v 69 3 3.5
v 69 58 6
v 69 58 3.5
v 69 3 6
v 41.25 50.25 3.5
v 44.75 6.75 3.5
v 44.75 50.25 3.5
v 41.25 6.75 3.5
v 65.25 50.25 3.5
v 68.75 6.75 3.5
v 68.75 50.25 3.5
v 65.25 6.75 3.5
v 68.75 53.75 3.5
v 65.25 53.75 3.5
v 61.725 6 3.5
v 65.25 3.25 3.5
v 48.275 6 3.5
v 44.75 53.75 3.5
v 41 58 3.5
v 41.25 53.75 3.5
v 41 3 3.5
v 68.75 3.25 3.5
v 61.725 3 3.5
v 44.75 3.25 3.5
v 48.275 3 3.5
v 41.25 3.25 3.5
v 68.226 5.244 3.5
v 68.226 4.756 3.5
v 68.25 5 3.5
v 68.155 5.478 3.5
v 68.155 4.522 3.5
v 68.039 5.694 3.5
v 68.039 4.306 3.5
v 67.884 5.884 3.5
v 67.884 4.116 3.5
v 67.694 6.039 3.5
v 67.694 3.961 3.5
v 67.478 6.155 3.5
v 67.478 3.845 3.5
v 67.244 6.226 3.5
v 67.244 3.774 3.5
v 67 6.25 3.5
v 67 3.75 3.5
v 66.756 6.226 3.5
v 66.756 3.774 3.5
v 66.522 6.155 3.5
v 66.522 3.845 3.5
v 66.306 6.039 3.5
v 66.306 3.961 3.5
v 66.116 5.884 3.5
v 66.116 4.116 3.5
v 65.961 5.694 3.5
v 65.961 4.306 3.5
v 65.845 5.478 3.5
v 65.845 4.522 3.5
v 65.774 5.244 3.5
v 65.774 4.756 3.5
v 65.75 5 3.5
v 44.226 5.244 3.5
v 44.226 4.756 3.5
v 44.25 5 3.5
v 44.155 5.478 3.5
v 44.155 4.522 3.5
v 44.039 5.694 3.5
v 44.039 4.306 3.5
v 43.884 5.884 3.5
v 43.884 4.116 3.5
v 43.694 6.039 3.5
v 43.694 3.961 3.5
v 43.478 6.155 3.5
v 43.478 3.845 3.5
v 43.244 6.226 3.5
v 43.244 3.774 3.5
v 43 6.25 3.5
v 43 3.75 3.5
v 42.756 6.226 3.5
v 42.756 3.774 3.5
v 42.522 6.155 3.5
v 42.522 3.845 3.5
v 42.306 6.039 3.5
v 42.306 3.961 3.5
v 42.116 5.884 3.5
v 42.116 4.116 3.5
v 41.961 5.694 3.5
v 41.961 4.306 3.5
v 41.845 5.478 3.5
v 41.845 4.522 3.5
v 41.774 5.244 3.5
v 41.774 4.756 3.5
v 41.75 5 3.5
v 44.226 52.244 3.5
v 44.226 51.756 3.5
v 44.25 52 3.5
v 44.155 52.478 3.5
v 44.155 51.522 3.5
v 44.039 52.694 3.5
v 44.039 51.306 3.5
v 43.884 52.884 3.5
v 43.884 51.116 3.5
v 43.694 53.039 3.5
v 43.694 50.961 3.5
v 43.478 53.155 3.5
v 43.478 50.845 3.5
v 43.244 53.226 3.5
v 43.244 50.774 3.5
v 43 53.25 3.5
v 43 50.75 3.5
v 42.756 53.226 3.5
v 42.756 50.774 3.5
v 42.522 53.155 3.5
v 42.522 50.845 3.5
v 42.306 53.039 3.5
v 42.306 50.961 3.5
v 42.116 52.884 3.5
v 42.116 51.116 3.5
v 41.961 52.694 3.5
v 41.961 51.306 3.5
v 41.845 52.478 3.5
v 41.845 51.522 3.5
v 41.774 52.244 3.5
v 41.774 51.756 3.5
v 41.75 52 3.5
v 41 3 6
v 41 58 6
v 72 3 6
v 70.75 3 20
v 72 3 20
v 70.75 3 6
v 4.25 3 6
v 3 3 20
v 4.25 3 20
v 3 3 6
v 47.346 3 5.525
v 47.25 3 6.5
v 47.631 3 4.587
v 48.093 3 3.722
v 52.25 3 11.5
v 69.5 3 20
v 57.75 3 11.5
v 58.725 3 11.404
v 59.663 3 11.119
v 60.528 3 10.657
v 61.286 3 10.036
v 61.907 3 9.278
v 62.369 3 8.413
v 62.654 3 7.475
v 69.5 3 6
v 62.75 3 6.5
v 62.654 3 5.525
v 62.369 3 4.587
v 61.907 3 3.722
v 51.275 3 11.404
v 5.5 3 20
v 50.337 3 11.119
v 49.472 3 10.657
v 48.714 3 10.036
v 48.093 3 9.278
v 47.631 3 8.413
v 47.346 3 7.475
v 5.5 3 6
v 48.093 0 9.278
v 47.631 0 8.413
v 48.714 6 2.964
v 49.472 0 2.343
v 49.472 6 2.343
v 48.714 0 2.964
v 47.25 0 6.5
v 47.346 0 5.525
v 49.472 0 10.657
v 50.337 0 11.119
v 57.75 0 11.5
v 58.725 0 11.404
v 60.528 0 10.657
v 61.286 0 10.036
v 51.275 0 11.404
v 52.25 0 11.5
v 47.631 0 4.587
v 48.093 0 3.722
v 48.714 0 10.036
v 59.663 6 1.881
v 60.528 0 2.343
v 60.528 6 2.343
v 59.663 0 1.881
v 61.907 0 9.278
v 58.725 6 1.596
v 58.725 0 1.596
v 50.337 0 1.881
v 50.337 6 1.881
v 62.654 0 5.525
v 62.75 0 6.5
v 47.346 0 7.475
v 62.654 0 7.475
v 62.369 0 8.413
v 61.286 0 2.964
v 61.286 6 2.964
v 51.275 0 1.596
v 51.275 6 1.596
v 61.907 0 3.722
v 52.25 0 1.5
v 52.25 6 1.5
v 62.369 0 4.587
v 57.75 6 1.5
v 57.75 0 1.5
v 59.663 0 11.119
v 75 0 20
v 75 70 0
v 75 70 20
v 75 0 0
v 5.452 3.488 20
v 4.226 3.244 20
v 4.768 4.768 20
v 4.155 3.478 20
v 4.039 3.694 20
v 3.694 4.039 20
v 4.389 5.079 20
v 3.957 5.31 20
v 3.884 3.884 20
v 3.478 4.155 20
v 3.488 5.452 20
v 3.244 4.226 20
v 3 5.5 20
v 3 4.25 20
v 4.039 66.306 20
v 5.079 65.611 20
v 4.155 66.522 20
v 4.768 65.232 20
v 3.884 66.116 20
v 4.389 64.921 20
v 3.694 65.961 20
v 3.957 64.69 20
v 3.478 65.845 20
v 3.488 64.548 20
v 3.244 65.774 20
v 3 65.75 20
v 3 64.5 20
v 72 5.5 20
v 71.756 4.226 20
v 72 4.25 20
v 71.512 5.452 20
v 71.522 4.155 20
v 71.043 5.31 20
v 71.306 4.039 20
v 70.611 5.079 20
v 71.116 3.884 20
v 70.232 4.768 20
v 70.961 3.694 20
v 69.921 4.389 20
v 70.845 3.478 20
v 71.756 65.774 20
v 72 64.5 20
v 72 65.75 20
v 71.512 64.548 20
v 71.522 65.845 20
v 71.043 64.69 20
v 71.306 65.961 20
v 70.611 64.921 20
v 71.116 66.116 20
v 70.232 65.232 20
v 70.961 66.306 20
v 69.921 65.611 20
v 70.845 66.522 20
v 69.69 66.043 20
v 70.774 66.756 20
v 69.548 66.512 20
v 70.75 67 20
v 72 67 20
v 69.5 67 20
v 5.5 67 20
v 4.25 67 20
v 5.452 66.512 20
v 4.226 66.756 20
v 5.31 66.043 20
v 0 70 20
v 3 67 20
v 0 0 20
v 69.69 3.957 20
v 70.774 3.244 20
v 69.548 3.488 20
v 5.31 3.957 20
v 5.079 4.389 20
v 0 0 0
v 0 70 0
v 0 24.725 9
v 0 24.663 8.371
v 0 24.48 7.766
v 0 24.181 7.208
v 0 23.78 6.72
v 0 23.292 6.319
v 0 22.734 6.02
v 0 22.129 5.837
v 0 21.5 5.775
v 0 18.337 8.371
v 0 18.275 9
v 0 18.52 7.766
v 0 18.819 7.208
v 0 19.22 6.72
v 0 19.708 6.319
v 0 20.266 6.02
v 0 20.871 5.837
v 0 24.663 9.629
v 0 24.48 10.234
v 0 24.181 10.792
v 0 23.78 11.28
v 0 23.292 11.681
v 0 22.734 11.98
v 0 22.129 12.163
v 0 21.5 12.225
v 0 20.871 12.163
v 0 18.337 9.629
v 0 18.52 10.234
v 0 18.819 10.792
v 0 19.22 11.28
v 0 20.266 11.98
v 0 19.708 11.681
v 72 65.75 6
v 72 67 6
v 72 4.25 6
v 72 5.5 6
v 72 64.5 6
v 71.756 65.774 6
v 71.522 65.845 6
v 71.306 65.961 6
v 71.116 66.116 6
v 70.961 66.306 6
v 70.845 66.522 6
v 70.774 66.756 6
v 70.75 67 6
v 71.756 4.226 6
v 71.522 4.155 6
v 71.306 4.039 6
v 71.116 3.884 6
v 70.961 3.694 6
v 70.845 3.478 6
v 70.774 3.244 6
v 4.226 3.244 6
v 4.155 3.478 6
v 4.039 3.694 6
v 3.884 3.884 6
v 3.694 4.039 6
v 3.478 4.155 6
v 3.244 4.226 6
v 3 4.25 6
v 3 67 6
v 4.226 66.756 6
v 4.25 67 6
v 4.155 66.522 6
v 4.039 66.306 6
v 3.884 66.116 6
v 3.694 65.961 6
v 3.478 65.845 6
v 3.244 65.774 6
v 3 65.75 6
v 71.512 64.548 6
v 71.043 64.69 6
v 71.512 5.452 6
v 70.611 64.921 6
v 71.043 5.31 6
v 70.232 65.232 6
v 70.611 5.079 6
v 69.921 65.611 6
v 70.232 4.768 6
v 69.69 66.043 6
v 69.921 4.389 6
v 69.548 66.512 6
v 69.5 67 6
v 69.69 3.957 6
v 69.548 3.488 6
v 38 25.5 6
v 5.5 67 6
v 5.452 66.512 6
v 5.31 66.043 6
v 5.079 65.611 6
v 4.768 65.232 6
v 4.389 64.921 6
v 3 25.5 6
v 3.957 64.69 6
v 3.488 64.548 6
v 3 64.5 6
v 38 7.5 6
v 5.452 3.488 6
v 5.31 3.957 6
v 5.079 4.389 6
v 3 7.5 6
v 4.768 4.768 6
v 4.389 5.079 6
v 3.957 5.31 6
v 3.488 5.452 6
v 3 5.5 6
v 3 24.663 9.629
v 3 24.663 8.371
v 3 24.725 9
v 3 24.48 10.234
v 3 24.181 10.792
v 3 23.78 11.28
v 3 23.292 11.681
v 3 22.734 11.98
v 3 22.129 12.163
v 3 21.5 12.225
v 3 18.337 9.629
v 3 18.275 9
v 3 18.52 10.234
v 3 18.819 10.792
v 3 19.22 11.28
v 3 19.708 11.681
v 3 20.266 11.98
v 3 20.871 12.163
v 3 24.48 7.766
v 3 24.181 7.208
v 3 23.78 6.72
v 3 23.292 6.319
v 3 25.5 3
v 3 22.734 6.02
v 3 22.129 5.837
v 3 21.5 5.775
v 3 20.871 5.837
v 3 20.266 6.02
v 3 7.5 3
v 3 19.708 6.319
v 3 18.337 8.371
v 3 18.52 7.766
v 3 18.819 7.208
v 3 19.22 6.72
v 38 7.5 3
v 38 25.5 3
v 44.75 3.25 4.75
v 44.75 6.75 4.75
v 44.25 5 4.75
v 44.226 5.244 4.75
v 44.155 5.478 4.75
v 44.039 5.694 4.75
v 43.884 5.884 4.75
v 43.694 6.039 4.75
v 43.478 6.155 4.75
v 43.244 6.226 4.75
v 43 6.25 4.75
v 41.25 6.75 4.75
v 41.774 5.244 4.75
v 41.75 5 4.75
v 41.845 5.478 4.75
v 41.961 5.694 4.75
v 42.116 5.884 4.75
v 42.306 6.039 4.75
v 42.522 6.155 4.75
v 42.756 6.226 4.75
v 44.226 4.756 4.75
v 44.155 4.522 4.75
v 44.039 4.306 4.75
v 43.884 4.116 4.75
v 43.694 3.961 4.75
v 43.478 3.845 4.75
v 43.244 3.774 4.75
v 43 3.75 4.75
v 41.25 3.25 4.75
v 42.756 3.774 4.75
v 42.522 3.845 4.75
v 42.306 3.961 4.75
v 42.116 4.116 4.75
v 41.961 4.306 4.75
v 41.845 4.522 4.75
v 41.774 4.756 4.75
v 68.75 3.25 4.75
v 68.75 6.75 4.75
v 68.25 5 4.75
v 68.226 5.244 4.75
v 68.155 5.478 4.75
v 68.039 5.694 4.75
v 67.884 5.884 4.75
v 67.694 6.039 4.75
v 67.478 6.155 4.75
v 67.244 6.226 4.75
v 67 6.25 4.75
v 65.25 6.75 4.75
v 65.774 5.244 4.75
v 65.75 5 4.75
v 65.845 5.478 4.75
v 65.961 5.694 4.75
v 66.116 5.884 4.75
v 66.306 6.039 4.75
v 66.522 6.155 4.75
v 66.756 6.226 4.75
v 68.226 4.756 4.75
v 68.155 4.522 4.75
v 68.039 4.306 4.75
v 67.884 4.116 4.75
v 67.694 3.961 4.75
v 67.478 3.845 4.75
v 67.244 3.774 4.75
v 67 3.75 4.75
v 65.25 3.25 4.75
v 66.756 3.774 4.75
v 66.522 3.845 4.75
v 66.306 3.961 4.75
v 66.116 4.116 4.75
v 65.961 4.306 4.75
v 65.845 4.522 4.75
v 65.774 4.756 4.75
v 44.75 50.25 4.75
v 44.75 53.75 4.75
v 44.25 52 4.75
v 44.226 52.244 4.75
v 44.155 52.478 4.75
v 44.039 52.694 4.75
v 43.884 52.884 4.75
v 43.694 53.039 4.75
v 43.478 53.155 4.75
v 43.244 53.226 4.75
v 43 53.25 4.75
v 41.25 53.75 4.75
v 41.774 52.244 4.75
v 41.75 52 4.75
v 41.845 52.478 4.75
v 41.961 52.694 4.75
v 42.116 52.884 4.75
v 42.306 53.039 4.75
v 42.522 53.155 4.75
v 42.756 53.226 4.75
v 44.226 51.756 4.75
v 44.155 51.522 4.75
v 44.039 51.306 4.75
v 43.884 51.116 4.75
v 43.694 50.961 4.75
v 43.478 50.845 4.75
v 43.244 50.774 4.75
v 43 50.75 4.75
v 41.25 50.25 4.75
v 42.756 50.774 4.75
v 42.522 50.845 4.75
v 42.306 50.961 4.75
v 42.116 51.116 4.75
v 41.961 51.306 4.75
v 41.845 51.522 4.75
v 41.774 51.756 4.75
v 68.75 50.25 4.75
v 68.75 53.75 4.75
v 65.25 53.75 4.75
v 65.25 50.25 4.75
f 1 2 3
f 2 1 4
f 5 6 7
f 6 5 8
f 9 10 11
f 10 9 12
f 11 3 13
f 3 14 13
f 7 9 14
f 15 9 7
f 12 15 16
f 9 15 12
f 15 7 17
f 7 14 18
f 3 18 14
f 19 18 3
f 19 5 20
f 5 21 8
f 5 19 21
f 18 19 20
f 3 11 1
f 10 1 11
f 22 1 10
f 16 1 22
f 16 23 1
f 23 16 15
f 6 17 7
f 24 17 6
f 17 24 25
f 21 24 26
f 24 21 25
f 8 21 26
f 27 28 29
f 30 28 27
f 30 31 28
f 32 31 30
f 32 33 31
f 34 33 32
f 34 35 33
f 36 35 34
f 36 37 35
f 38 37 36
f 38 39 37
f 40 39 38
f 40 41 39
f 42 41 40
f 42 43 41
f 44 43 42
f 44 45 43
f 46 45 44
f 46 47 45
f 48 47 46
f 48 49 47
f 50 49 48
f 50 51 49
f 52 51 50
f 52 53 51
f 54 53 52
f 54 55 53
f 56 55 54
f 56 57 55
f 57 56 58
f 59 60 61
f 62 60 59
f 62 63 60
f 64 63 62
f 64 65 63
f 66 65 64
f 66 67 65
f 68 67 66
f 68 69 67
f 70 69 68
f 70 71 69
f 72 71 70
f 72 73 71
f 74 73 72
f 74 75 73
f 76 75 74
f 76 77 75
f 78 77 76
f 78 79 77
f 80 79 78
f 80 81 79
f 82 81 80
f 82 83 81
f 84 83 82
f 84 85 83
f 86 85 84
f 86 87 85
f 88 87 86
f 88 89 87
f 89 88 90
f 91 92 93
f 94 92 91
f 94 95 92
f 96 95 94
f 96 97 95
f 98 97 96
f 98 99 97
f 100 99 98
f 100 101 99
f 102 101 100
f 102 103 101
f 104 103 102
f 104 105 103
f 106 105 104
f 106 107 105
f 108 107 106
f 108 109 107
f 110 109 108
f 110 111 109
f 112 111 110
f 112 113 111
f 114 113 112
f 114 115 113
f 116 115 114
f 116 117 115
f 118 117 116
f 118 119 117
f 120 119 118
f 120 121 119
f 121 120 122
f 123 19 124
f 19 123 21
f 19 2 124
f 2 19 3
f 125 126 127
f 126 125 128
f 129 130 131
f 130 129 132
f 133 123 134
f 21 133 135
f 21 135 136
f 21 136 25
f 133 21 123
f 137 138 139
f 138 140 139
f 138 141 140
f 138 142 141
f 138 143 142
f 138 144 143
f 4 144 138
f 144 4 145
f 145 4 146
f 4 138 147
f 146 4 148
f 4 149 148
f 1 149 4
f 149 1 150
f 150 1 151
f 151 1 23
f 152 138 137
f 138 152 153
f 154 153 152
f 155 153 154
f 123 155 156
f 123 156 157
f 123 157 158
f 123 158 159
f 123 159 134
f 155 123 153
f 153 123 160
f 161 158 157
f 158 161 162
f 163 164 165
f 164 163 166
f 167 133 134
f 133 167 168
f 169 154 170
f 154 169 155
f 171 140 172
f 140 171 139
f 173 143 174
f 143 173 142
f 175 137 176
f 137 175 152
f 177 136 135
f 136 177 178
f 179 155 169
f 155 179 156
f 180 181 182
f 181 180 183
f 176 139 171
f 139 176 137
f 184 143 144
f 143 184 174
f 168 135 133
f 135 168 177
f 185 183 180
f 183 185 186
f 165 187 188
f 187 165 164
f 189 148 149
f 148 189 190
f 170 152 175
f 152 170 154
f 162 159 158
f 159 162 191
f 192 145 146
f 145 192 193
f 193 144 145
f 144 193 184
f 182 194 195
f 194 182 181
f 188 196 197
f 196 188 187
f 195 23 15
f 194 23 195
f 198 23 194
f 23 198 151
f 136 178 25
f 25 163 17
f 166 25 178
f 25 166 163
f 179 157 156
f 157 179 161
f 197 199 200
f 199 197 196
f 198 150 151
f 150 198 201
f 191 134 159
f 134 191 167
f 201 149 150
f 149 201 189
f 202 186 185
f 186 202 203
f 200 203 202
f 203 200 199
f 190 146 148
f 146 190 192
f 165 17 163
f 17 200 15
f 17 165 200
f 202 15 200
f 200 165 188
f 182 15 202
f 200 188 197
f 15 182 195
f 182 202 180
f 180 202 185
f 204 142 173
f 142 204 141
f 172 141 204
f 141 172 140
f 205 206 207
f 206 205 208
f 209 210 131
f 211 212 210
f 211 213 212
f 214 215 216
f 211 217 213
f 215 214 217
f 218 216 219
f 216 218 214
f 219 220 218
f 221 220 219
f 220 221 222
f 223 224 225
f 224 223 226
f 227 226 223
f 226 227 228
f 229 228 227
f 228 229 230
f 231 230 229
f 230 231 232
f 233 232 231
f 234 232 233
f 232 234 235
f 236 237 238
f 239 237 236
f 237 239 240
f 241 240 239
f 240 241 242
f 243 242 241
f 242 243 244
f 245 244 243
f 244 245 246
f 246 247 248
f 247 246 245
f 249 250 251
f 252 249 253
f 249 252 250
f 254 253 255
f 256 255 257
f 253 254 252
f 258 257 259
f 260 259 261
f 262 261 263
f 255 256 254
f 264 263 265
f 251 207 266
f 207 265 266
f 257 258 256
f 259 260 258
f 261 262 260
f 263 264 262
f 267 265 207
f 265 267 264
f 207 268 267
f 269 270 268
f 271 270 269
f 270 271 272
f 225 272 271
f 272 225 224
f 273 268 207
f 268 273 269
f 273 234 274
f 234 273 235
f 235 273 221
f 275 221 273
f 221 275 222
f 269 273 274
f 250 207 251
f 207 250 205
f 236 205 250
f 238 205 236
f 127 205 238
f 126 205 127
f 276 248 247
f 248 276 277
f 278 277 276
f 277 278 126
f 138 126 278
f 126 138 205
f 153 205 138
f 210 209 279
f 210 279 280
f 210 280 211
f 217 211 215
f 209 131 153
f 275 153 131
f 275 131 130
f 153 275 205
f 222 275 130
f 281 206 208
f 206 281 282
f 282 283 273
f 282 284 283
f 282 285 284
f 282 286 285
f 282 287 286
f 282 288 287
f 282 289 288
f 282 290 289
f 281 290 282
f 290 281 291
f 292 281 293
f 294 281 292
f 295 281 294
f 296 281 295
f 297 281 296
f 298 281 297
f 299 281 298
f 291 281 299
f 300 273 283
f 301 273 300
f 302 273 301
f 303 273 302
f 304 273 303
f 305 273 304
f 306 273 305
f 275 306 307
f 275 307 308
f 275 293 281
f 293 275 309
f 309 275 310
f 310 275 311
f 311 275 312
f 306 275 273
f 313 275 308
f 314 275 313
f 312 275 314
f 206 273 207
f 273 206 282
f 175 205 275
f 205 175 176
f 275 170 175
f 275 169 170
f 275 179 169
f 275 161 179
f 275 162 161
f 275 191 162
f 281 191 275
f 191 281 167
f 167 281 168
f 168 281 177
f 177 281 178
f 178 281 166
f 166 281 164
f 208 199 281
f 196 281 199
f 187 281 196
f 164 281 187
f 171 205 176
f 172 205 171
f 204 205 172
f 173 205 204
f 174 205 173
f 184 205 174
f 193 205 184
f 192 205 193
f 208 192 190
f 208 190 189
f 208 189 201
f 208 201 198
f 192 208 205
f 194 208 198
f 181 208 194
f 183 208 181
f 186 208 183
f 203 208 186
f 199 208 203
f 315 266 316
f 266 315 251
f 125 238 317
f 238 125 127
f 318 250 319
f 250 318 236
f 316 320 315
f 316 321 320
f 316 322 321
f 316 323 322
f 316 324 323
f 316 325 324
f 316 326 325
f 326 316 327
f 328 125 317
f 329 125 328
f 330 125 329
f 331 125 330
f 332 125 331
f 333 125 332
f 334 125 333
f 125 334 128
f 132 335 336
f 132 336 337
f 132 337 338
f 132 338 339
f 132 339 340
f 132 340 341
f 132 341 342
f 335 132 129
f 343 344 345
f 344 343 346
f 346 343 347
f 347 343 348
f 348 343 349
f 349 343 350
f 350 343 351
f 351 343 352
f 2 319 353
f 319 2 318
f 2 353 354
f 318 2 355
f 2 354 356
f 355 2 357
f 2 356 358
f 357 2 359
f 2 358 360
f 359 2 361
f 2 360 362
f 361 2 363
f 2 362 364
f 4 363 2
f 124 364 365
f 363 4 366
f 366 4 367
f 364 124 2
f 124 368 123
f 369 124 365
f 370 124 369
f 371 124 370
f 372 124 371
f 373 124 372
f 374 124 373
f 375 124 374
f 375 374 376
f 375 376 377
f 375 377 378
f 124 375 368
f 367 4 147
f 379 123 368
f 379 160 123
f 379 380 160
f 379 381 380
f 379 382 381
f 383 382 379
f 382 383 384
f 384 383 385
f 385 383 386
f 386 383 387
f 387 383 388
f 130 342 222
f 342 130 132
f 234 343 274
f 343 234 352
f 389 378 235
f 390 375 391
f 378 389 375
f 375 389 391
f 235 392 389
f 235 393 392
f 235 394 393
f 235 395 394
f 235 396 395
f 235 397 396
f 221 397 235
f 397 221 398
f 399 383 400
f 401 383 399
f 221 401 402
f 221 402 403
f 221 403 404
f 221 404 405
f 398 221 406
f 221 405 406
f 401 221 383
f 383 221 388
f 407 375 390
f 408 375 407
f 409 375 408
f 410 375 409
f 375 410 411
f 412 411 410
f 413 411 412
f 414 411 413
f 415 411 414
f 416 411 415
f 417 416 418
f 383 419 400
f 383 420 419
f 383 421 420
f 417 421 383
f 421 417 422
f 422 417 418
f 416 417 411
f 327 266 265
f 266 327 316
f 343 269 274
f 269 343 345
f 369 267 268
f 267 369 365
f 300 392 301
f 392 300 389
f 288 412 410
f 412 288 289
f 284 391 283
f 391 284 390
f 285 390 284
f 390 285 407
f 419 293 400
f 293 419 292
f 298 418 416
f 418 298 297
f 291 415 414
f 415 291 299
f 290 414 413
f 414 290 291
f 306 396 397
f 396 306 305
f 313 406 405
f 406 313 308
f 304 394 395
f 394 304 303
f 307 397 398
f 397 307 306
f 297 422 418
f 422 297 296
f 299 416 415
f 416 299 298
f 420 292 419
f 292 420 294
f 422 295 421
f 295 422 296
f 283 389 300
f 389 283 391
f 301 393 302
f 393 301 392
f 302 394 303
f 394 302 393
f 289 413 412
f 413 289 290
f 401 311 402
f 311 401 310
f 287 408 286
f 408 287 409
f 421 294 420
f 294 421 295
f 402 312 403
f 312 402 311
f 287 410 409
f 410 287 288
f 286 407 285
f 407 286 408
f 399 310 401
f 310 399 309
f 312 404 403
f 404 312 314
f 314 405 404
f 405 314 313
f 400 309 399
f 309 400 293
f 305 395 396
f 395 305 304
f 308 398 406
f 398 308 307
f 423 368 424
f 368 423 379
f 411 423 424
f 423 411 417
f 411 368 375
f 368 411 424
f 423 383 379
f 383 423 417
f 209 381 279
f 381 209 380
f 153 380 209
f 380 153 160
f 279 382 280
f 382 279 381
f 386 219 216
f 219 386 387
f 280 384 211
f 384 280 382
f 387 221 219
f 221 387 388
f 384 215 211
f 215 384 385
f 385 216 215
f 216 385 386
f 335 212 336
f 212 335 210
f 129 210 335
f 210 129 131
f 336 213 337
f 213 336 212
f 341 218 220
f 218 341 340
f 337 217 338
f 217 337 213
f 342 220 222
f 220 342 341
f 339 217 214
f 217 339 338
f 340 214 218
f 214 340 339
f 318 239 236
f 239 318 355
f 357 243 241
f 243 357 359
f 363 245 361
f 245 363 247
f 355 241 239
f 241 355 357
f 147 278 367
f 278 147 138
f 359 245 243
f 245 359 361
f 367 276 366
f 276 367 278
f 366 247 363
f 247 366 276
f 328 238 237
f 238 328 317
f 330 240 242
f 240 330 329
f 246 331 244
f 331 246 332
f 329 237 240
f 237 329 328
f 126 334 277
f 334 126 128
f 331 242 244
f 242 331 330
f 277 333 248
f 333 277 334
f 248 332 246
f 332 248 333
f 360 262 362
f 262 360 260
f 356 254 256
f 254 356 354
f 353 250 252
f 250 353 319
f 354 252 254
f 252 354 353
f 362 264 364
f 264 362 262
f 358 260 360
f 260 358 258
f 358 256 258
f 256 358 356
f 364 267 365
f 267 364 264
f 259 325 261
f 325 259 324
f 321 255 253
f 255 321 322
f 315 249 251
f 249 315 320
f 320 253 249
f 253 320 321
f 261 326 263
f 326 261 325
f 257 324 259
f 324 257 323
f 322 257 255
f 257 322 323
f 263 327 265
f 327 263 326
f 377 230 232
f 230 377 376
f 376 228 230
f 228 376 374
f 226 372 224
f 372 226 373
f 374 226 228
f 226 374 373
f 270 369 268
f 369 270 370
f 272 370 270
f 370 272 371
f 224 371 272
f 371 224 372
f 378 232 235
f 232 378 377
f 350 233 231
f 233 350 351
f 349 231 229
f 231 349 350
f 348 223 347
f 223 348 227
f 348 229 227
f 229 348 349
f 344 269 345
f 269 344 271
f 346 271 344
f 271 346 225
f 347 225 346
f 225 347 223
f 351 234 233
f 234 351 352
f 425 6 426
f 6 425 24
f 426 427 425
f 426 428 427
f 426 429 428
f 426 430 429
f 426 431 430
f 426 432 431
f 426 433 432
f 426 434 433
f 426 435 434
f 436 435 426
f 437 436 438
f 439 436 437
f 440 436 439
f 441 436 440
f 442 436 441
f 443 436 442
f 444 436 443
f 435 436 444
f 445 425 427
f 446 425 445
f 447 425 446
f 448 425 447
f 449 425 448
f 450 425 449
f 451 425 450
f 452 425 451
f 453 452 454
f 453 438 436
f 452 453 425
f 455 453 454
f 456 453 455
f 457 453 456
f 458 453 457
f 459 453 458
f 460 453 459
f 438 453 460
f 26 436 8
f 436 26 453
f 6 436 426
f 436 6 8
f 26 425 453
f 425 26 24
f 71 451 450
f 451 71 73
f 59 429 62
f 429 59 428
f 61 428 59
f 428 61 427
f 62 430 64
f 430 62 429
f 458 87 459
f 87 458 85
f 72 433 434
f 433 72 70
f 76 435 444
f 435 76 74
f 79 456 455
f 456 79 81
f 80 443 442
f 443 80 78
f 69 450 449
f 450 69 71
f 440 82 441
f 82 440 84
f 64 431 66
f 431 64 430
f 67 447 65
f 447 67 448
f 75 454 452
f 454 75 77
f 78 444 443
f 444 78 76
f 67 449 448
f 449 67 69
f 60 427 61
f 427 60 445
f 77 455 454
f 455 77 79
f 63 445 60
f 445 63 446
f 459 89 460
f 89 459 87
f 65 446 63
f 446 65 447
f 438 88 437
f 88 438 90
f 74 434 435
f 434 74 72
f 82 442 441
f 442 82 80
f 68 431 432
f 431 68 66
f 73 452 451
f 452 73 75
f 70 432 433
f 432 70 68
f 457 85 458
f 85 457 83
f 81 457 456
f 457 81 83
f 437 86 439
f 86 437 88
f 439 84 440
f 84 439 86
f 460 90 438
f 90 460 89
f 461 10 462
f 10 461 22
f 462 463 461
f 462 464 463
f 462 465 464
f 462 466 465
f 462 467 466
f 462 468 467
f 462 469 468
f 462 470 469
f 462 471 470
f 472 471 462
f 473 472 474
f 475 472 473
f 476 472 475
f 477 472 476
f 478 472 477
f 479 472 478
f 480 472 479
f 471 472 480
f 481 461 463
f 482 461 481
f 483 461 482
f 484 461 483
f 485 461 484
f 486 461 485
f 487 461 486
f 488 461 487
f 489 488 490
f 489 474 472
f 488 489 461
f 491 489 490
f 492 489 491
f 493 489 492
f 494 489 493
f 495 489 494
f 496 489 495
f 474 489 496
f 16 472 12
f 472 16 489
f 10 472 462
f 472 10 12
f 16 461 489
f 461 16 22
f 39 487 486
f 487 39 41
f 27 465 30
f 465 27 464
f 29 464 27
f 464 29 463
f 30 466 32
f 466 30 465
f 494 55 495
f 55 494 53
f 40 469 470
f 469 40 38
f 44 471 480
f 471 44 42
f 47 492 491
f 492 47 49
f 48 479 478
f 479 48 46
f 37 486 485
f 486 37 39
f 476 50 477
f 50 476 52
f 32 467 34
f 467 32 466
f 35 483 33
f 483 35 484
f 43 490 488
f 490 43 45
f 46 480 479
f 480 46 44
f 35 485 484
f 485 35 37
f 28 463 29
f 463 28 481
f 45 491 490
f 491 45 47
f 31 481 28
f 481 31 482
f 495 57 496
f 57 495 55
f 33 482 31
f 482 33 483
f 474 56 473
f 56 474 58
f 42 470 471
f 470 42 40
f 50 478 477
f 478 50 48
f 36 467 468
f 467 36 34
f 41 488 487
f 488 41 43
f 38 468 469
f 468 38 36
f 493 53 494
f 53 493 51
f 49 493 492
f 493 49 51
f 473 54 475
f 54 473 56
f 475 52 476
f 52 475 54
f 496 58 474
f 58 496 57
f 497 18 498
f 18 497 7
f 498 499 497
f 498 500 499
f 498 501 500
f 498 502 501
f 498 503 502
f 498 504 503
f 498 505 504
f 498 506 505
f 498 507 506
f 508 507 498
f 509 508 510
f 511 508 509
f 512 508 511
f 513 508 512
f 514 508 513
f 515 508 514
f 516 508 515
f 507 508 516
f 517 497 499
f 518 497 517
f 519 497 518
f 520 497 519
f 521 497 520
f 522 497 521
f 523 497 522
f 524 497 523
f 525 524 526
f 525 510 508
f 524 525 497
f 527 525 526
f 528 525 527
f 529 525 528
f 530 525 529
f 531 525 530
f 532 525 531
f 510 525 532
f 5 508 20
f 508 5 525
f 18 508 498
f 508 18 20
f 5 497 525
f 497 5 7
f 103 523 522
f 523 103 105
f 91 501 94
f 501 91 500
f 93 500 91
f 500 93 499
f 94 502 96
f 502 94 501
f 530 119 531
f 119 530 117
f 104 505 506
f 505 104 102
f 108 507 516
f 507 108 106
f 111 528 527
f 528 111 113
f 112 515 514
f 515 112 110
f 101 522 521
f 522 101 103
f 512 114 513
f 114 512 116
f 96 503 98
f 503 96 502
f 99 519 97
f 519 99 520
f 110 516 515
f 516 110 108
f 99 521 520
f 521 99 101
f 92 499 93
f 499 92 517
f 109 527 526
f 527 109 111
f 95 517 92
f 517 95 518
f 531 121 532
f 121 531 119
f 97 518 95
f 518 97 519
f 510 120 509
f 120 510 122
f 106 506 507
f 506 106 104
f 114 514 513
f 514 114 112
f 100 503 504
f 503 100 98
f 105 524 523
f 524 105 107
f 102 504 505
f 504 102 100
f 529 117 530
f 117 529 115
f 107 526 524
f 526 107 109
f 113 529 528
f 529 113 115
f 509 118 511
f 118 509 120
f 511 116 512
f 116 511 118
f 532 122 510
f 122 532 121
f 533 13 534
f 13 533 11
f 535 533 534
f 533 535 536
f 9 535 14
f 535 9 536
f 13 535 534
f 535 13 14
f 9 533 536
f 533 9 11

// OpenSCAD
//r = 3.175;
//n = 10;
//$fn = r * cos(pi/n); apotema
$fn = 32;
union(){
difference(){
    
    union(){
        ///////CASE WALLS
        //case (+ 3 mm walls)
        cube([75,70,20]); 
        }
        
    //case cavity
    translate([3,3,6]) cube([69,64,21]);
    
    //SMA connector cavity
    translate([-5,21.5,9]) rotate([0,90,0]) 
    cylinder(h = 11.5,d = 6.45 );
    
    //DX-LR02 cavity
   translate([3,4+3.5,3])cube([35,18,6]);
    
    
    //ESP32 cavity
    translate([0,0,1.5])
        union(){
    translate([69-28,3,2])cube([28,55,6]);
    //USB-C cavity
    hull(){
        translate([69-(28/2)+2.75,6,5]) rotate([90,0,0]) cylinder(h=7,d=10);
        translate([69-(28/2)-2.75,6,5]) rotate([90,0,0]) cylinder(h=7,d=10);
        }
    }
}
    
//case-closing-screws turrets
        difference(){
        translate([3,3,6]) cylinder(h=14,d=5);
            #translate([3,3,6])cylinder(h=20,d=2.5);  //screw hole
        }
        difference(){
        translate([72,3,6]) cylinder(h=14,d=5);
            #translate([72,3,6])cylinder(h=20,d=2.5);
            
        }
        difference(){
        translate([72,67,6]) cylinder(h=14,d=5);              
            #translate([72,67,6])cylinder(h=20,d=2.5);
        }
        
        difference(){
        translate([3,67,6]) cylinder(h=14,d=5);
            #translate([3,67,6])cylinder(h=20,d=2.5);
            }
       //esp32 screwholes
            difference(){
        translate([69-26,5,3])cube([3.5,3.5,3.5],center = true);
                #translate([69-26,5,5])cylinder(h=3,d=2.5,center = true);
            }
                        difference(){
        translate([69-2,5,3])cube([3.5,3.5,3.5],center = true);
                #translate([69-2,5,5])cylinder(h=3,d=2.5,center = true);
            }
                     difference(){
        translate([69-26,52,3])cube([3.5,3.5,3.5],center = true);
                #translate([69-26,52,5])cylinder(h=3,d=2.5,center = true);
            }
                     difference(){
        translate([69-2,52,3])cube([3.5,3.5,3.5],center = true);
                #translate([69-22,52,5])cylinder(h=3,d=2.5,center = true);
            }
        }
    
